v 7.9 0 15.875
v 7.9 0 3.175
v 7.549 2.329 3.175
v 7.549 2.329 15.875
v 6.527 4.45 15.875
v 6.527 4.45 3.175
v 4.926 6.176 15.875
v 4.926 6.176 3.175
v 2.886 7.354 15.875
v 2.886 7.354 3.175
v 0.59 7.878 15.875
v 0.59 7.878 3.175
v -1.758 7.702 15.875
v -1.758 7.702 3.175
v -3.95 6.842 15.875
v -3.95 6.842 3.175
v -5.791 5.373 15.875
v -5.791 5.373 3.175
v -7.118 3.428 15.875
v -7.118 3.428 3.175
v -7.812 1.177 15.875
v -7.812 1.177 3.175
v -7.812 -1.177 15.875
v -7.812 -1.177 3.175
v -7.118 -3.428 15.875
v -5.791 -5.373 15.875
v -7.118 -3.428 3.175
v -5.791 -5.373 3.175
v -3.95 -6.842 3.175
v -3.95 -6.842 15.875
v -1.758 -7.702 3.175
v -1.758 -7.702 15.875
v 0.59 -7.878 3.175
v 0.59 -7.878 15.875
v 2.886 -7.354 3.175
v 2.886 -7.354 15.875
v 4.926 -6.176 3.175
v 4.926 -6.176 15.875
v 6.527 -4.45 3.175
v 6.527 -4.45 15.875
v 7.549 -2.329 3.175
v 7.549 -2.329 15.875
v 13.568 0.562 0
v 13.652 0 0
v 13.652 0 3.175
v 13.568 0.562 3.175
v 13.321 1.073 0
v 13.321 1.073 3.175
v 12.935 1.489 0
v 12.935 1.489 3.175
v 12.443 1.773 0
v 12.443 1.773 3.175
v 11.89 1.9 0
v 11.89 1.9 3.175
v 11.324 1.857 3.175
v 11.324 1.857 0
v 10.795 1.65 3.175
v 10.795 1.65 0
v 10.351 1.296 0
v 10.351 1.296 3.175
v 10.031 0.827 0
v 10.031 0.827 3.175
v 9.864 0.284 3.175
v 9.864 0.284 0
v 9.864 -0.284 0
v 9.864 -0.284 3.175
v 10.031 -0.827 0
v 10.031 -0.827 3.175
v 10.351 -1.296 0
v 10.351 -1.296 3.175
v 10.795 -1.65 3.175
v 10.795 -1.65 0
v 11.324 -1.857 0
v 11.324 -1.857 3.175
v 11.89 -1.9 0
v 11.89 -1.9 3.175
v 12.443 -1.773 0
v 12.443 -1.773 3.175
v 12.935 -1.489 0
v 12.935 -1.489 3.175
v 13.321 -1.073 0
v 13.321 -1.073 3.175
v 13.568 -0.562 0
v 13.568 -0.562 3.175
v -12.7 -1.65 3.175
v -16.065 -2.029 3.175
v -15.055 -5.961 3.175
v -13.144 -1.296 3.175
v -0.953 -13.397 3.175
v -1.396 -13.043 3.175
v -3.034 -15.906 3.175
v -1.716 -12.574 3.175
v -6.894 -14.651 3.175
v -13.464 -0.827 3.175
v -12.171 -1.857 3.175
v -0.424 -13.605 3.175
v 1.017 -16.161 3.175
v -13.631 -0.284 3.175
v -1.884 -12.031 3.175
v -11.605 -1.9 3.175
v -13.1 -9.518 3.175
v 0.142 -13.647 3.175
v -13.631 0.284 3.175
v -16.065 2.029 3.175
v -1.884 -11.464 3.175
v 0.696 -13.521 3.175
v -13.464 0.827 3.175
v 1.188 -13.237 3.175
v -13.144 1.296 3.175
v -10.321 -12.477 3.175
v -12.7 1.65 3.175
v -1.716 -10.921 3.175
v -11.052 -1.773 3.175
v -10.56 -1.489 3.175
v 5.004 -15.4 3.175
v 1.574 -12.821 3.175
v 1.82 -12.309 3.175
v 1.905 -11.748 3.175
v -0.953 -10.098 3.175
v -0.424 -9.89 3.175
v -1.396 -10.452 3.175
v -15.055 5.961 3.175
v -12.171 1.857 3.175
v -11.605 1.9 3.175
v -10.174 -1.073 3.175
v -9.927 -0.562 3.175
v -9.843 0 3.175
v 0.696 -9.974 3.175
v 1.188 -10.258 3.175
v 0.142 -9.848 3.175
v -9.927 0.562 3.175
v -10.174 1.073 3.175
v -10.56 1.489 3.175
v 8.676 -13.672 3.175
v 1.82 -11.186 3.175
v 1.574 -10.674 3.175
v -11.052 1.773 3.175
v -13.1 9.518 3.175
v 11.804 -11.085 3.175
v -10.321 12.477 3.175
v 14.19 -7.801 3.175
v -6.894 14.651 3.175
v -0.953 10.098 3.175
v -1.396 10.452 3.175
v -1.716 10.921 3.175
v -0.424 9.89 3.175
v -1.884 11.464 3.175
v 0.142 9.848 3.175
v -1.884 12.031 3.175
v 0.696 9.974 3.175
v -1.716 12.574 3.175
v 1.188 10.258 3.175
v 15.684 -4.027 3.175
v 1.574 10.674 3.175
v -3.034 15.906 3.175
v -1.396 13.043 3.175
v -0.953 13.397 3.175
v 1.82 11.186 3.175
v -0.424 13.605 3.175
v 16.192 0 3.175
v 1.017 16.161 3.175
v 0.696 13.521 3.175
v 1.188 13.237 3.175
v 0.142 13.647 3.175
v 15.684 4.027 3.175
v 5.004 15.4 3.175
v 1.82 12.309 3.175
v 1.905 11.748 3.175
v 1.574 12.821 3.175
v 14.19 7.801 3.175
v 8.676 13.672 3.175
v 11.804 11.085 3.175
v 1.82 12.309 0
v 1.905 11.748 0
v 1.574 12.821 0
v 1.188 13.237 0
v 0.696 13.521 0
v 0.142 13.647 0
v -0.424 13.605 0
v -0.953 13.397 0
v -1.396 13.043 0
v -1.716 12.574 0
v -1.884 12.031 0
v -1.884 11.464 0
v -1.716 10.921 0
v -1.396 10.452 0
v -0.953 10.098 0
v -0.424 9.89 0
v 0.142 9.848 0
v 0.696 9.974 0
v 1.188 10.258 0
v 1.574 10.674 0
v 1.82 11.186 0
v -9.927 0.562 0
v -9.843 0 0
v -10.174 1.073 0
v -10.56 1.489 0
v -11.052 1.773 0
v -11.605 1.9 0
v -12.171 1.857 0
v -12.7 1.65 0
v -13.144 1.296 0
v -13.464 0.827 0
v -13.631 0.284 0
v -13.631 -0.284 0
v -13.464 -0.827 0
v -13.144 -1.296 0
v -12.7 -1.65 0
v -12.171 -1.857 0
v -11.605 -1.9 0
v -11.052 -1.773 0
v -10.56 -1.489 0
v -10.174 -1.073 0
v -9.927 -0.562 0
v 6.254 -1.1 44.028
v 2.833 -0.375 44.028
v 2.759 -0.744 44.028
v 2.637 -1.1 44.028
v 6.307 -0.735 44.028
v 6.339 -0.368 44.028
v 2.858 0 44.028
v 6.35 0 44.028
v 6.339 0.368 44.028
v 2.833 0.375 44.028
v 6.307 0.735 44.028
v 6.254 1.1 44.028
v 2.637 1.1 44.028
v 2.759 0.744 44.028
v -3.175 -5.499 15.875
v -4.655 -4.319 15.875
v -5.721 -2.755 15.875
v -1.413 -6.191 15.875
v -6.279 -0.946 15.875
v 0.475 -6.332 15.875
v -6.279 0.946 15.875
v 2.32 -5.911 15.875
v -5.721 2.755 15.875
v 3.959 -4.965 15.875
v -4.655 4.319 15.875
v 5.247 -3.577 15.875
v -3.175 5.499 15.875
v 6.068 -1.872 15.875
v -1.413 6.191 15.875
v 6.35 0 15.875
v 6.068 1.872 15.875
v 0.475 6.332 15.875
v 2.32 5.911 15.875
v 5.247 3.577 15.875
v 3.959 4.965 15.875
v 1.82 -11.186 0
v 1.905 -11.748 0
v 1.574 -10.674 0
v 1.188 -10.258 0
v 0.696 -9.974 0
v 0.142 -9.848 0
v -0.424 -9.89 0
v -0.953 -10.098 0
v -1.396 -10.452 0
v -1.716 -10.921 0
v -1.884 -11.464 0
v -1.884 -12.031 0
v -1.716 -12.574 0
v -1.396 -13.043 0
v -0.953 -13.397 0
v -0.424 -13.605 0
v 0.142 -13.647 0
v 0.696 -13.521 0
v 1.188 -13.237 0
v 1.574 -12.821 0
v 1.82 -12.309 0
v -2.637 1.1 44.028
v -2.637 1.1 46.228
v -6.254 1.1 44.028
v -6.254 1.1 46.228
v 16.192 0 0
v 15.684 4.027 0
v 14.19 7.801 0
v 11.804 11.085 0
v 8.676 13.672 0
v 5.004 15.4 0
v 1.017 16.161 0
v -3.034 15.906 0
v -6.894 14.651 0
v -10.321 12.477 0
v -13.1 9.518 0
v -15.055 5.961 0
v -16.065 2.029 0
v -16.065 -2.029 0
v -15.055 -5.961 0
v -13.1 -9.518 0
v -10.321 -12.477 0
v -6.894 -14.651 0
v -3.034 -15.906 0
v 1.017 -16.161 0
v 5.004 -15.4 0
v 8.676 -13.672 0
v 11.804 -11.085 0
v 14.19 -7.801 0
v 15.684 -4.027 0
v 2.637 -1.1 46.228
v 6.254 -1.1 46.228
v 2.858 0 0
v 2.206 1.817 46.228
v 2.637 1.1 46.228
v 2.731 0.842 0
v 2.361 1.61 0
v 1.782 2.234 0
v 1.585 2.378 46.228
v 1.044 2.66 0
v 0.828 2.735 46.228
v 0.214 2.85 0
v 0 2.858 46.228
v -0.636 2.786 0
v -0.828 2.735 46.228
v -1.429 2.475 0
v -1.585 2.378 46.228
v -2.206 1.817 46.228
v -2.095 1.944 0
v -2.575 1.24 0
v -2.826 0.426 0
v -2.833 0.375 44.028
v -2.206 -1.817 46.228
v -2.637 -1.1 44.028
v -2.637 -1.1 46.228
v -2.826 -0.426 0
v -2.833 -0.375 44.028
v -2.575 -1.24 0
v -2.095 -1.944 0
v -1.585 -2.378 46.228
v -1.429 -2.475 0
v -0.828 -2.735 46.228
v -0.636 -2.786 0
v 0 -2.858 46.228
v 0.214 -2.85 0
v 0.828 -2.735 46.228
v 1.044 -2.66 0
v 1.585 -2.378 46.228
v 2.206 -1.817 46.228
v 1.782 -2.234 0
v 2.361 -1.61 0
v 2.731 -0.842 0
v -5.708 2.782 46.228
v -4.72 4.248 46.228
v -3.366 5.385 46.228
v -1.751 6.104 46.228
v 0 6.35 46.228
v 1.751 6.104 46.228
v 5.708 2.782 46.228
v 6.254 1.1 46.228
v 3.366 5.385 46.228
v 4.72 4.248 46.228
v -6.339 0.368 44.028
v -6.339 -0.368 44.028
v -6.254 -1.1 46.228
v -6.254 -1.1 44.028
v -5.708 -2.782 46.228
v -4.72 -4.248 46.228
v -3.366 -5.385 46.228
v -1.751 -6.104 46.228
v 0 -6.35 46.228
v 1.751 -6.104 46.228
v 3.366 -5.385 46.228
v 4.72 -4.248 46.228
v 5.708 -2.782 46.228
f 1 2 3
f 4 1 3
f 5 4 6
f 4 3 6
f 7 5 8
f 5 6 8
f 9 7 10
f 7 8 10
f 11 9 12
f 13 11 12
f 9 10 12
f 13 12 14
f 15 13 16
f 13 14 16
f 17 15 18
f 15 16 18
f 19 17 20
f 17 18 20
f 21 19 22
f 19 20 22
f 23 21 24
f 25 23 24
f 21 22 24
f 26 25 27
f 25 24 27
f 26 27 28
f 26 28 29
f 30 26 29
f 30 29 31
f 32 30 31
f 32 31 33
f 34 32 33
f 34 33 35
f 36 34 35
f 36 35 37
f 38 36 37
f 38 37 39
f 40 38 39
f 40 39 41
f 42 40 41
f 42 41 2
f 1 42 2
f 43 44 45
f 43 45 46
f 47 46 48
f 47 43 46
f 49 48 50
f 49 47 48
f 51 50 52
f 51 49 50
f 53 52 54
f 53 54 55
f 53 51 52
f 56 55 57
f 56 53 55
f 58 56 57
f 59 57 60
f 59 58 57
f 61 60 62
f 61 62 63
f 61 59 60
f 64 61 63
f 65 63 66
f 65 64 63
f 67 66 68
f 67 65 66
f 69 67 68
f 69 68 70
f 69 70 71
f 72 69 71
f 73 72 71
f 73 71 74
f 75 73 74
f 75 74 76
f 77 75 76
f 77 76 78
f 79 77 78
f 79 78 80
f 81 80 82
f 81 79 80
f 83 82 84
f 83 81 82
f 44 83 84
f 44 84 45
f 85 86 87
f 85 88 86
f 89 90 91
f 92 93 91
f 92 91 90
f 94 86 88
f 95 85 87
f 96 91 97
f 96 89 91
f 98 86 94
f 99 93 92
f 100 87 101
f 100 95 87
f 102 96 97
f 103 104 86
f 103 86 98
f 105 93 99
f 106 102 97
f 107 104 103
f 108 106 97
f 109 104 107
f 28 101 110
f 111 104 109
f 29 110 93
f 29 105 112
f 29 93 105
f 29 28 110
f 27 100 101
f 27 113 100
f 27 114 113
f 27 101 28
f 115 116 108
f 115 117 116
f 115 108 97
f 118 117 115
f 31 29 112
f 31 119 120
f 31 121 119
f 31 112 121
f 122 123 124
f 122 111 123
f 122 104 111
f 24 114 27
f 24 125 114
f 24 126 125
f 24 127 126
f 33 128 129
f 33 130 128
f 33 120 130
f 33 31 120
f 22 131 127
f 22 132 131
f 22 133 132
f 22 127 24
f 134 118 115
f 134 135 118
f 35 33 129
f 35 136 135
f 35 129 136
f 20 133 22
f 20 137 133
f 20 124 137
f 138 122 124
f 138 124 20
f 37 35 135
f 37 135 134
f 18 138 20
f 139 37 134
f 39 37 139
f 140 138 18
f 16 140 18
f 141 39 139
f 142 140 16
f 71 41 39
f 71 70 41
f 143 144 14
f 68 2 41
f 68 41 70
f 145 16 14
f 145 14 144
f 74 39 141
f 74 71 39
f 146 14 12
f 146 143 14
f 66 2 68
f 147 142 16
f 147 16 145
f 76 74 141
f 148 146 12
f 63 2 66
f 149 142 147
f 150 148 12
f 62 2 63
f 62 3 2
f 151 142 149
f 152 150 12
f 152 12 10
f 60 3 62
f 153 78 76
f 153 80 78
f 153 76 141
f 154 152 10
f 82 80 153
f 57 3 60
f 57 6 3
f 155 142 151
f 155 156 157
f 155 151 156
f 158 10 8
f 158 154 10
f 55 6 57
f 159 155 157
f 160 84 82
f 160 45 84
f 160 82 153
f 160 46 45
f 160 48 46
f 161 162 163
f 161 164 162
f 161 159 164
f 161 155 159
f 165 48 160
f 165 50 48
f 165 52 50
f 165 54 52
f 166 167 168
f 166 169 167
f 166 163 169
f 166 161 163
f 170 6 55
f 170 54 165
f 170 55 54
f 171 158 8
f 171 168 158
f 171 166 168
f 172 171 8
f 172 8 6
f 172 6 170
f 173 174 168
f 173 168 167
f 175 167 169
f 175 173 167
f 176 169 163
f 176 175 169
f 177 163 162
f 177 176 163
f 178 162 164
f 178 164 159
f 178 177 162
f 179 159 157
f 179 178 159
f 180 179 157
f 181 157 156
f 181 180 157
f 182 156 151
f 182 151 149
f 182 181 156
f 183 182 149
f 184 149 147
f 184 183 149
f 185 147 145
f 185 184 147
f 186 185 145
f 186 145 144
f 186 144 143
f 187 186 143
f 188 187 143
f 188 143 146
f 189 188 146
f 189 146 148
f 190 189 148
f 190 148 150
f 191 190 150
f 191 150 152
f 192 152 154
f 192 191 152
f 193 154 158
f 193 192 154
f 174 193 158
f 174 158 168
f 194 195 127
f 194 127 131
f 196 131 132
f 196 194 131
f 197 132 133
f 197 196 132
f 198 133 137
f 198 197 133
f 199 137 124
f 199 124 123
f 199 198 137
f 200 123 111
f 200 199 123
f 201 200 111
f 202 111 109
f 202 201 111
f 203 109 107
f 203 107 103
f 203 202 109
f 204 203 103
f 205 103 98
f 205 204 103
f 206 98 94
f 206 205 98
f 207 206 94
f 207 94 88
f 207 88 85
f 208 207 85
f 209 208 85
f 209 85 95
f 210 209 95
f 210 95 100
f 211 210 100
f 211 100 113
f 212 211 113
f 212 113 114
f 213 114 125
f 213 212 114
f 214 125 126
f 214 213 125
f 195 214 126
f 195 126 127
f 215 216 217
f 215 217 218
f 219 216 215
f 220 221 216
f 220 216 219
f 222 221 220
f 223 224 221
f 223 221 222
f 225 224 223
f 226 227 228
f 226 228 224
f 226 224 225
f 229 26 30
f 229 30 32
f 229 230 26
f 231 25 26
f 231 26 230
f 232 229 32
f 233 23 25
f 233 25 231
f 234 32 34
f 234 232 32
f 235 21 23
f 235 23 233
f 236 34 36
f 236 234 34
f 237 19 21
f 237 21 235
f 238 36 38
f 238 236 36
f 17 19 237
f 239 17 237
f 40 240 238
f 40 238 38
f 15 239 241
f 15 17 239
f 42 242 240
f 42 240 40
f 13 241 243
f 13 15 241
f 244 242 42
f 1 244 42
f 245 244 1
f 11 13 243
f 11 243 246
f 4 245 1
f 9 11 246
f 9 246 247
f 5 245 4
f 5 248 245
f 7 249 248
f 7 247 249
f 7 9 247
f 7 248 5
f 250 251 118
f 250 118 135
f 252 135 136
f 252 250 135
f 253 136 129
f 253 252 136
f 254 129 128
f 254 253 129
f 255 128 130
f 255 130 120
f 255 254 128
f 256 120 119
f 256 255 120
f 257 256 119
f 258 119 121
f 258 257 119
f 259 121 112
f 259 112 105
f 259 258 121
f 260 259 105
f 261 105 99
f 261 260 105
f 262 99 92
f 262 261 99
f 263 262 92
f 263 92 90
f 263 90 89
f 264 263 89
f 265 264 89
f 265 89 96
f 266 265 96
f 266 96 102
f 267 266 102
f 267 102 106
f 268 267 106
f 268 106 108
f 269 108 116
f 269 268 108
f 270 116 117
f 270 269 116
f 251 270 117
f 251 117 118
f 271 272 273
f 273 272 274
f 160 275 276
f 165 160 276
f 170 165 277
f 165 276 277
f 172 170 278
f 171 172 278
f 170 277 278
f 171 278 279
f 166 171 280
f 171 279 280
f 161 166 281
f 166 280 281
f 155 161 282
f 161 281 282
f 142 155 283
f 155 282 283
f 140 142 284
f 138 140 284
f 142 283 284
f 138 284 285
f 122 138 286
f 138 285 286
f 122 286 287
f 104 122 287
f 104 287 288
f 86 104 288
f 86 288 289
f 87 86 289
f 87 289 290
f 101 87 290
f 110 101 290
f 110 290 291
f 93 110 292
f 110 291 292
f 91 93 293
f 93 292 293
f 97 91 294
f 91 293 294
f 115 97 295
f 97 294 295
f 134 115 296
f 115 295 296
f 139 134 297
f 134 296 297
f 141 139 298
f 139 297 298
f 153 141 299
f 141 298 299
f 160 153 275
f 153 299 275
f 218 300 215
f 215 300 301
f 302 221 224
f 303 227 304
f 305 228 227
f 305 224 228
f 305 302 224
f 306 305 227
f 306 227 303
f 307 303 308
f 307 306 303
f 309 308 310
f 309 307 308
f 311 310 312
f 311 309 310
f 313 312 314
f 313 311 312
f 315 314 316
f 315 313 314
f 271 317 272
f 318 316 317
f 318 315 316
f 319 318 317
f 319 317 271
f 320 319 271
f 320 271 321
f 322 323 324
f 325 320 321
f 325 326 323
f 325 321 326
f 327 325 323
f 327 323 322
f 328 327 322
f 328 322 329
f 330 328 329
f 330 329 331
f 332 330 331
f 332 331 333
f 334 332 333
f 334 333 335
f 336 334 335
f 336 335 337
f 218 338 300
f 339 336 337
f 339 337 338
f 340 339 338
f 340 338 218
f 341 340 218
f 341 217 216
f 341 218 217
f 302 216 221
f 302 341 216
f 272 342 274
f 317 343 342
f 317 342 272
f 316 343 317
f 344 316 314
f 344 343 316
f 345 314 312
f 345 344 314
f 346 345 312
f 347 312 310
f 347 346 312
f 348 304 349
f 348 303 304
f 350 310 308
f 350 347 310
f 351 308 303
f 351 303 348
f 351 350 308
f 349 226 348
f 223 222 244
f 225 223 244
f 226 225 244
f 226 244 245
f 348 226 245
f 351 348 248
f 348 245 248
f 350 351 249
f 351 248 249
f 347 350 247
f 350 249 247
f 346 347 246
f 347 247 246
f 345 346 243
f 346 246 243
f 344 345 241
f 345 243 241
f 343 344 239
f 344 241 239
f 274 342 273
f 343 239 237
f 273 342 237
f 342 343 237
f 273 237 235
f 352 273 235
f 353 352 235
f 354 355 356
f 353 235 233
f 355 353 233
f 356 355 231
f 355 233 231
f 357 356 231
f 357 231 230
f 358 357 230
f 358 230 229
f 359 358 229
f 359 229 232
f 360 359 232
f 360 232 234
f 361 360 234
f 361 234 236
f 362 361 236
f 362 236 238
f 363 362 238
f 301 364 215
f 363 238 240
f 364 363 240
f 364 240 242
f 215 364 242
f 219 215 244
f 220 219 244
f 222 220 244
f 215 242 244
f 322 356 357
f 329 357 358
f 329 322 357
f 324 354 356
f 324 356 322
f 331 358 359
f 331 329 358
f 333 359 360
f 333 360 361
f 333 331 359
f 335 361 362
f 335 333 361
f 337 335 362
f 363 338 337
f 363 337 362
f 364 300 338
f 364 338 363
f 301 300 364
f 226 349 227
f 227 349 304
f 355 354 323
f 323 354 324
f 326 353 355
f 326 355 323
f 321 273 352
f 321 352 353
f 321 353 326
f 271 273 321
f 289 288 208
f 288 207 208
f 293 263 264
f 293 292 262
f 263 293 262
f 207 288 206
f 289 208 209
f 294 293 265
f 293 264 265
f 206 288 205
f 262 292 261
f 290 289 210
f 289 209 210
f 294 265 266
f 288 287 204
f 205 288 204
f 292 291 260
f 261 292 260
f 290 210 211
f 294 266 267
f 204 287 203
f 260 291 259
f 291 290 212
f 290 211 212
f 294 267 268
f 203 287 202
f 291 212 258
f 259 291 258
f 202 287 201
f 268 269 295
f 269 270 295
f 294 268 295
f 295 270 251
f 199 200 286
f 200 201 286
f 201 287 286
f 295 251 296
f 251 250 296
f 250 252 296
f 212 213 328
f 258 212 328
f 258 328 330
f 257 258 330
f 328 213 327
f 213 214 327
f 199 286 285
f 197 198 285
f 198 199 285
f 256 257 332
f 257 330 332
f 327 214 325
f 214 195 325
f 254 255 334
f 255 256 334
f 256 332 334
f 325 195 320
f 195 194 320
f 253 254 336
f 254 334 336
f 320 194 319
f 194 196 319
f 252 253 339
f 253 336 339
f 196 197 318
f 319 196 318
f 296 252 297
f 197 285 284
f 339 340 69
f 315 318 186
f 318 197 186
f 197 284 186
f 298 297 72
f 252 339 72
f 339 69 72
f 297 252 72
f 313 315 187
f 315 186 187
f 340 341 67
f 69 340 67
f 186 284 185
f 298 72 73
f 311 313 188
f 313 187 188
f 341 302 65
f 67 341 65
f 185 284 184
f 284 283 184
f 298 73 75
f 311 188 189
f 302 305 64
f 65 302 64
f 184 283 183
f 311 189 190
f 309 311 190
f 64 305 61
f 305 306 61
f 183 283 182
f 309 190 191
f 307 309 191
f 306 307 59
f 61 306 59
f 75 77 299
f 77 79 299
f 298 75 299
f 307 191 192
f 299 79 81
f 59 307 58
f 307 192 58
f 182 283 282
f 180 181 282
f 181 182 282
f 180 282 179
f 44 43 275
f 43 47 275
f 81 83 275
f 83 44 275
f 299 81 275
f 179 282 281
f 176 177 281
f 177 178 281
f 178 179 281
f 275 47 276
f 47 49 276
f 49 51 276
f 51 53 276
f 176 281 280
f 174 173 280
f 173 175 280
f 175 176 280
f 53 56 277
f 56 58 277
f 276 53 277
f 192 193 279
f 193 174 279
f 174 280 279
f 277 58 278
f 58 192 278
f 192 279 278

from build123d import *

# Parameters (mm, degrees)
F0_R     = 7.9
F0_R_2   = 6.35
F1_DEPTH = 15.875
F0_R_3   = 2.8575
F2_DEPTH = 46.228
F0_R_4   = 16.1925
F0_R_5   = 1.905
F4_DEPTH = 3.175
F6_DEPTH = 2.2


with BuildPart() as f1:
    # F0 (on Top) → F1 (new body)
    with BuildSketch(Plane.XY):
        Circle(F0_R)
        Circle(F0_R_2, mode=Mode.SUBTRACT)
    extrude(amount=F1_DEPTH)

    # F0 (on Top) → F2 (join)
    with BuildSketch(Plane.XY):
        Circle(F0_R_2)
        Circle(F0_R_3, mode=Mode.SUBTRACT)
    extrude(amount=F2_DEPTH)

    # F0 (on Top) → F4 (join)
    with BuildSketch(Plane.XY):
        Circle(F0_R_4)
        with Locations((0, -11.7475)):
            Circle(F0_R_5, mode=Mode.SUBTRACT)
        with Locations((-11.7475, 0)):
            Circle(F0_R_5, mode=Mode.SUBTRACT)
        Circle(F0_R, mode=Mode.SUBTRACT)
        with Locations((11.7475, 0)):
            Circle(F0_R_5, mode=Mode.SUBTRACT)
        with Locations((0, 11.7475)):
            Circle(F0_R_5, mode=Mode.SUBTRACT)
    extrude(amount=F4_DEPTH)

    # F5 (on face) → F6 (cut)
    with BuildSketch(Plane.XY.offset(46.228)):
        with BuildLine():
            ThreePointArc((6.35, 0), (6.3259541524, 0.5520906279), (6.2539987208, 1.1))
            Line((6.2539987208, 1.1), (2.637291461, 1.1))
            ThreePointArc((2.637291461, 1.1), (2.8019070827, 0.5609126048), (2.8575, 0))
            ThreePointArc((2.8575, 0), (2.8019070827, -0.5609126048), (2.637291461, -1.1))
            Line((2.637291461, -1.1), (6.2539987208, -1.1))
            ThreePointArc((6.2539987208, -1.1), (6.3259541524, -0.5520906279), (6.35, 0))
        make_face()
        with BuildLine():
            Line((-2.637291461, 1.1), (-6.2539987208, 1.1))
            ThreePointArc((-6.2539987208, 1.1), (-6.35, 0), (-6.2539987208, -1.1))
            Line((-6.2539987208, -1.1), (-2.637291461, -1.1))
            ThreePointArc((-2.637291461, -1.1), (-2.8575, 0), (-2.637291461, 1.1))
        make_face()
    extrude(amount=-F6_DEPTH, mode=Mode.SUBTRACT)


solid = f1.part
